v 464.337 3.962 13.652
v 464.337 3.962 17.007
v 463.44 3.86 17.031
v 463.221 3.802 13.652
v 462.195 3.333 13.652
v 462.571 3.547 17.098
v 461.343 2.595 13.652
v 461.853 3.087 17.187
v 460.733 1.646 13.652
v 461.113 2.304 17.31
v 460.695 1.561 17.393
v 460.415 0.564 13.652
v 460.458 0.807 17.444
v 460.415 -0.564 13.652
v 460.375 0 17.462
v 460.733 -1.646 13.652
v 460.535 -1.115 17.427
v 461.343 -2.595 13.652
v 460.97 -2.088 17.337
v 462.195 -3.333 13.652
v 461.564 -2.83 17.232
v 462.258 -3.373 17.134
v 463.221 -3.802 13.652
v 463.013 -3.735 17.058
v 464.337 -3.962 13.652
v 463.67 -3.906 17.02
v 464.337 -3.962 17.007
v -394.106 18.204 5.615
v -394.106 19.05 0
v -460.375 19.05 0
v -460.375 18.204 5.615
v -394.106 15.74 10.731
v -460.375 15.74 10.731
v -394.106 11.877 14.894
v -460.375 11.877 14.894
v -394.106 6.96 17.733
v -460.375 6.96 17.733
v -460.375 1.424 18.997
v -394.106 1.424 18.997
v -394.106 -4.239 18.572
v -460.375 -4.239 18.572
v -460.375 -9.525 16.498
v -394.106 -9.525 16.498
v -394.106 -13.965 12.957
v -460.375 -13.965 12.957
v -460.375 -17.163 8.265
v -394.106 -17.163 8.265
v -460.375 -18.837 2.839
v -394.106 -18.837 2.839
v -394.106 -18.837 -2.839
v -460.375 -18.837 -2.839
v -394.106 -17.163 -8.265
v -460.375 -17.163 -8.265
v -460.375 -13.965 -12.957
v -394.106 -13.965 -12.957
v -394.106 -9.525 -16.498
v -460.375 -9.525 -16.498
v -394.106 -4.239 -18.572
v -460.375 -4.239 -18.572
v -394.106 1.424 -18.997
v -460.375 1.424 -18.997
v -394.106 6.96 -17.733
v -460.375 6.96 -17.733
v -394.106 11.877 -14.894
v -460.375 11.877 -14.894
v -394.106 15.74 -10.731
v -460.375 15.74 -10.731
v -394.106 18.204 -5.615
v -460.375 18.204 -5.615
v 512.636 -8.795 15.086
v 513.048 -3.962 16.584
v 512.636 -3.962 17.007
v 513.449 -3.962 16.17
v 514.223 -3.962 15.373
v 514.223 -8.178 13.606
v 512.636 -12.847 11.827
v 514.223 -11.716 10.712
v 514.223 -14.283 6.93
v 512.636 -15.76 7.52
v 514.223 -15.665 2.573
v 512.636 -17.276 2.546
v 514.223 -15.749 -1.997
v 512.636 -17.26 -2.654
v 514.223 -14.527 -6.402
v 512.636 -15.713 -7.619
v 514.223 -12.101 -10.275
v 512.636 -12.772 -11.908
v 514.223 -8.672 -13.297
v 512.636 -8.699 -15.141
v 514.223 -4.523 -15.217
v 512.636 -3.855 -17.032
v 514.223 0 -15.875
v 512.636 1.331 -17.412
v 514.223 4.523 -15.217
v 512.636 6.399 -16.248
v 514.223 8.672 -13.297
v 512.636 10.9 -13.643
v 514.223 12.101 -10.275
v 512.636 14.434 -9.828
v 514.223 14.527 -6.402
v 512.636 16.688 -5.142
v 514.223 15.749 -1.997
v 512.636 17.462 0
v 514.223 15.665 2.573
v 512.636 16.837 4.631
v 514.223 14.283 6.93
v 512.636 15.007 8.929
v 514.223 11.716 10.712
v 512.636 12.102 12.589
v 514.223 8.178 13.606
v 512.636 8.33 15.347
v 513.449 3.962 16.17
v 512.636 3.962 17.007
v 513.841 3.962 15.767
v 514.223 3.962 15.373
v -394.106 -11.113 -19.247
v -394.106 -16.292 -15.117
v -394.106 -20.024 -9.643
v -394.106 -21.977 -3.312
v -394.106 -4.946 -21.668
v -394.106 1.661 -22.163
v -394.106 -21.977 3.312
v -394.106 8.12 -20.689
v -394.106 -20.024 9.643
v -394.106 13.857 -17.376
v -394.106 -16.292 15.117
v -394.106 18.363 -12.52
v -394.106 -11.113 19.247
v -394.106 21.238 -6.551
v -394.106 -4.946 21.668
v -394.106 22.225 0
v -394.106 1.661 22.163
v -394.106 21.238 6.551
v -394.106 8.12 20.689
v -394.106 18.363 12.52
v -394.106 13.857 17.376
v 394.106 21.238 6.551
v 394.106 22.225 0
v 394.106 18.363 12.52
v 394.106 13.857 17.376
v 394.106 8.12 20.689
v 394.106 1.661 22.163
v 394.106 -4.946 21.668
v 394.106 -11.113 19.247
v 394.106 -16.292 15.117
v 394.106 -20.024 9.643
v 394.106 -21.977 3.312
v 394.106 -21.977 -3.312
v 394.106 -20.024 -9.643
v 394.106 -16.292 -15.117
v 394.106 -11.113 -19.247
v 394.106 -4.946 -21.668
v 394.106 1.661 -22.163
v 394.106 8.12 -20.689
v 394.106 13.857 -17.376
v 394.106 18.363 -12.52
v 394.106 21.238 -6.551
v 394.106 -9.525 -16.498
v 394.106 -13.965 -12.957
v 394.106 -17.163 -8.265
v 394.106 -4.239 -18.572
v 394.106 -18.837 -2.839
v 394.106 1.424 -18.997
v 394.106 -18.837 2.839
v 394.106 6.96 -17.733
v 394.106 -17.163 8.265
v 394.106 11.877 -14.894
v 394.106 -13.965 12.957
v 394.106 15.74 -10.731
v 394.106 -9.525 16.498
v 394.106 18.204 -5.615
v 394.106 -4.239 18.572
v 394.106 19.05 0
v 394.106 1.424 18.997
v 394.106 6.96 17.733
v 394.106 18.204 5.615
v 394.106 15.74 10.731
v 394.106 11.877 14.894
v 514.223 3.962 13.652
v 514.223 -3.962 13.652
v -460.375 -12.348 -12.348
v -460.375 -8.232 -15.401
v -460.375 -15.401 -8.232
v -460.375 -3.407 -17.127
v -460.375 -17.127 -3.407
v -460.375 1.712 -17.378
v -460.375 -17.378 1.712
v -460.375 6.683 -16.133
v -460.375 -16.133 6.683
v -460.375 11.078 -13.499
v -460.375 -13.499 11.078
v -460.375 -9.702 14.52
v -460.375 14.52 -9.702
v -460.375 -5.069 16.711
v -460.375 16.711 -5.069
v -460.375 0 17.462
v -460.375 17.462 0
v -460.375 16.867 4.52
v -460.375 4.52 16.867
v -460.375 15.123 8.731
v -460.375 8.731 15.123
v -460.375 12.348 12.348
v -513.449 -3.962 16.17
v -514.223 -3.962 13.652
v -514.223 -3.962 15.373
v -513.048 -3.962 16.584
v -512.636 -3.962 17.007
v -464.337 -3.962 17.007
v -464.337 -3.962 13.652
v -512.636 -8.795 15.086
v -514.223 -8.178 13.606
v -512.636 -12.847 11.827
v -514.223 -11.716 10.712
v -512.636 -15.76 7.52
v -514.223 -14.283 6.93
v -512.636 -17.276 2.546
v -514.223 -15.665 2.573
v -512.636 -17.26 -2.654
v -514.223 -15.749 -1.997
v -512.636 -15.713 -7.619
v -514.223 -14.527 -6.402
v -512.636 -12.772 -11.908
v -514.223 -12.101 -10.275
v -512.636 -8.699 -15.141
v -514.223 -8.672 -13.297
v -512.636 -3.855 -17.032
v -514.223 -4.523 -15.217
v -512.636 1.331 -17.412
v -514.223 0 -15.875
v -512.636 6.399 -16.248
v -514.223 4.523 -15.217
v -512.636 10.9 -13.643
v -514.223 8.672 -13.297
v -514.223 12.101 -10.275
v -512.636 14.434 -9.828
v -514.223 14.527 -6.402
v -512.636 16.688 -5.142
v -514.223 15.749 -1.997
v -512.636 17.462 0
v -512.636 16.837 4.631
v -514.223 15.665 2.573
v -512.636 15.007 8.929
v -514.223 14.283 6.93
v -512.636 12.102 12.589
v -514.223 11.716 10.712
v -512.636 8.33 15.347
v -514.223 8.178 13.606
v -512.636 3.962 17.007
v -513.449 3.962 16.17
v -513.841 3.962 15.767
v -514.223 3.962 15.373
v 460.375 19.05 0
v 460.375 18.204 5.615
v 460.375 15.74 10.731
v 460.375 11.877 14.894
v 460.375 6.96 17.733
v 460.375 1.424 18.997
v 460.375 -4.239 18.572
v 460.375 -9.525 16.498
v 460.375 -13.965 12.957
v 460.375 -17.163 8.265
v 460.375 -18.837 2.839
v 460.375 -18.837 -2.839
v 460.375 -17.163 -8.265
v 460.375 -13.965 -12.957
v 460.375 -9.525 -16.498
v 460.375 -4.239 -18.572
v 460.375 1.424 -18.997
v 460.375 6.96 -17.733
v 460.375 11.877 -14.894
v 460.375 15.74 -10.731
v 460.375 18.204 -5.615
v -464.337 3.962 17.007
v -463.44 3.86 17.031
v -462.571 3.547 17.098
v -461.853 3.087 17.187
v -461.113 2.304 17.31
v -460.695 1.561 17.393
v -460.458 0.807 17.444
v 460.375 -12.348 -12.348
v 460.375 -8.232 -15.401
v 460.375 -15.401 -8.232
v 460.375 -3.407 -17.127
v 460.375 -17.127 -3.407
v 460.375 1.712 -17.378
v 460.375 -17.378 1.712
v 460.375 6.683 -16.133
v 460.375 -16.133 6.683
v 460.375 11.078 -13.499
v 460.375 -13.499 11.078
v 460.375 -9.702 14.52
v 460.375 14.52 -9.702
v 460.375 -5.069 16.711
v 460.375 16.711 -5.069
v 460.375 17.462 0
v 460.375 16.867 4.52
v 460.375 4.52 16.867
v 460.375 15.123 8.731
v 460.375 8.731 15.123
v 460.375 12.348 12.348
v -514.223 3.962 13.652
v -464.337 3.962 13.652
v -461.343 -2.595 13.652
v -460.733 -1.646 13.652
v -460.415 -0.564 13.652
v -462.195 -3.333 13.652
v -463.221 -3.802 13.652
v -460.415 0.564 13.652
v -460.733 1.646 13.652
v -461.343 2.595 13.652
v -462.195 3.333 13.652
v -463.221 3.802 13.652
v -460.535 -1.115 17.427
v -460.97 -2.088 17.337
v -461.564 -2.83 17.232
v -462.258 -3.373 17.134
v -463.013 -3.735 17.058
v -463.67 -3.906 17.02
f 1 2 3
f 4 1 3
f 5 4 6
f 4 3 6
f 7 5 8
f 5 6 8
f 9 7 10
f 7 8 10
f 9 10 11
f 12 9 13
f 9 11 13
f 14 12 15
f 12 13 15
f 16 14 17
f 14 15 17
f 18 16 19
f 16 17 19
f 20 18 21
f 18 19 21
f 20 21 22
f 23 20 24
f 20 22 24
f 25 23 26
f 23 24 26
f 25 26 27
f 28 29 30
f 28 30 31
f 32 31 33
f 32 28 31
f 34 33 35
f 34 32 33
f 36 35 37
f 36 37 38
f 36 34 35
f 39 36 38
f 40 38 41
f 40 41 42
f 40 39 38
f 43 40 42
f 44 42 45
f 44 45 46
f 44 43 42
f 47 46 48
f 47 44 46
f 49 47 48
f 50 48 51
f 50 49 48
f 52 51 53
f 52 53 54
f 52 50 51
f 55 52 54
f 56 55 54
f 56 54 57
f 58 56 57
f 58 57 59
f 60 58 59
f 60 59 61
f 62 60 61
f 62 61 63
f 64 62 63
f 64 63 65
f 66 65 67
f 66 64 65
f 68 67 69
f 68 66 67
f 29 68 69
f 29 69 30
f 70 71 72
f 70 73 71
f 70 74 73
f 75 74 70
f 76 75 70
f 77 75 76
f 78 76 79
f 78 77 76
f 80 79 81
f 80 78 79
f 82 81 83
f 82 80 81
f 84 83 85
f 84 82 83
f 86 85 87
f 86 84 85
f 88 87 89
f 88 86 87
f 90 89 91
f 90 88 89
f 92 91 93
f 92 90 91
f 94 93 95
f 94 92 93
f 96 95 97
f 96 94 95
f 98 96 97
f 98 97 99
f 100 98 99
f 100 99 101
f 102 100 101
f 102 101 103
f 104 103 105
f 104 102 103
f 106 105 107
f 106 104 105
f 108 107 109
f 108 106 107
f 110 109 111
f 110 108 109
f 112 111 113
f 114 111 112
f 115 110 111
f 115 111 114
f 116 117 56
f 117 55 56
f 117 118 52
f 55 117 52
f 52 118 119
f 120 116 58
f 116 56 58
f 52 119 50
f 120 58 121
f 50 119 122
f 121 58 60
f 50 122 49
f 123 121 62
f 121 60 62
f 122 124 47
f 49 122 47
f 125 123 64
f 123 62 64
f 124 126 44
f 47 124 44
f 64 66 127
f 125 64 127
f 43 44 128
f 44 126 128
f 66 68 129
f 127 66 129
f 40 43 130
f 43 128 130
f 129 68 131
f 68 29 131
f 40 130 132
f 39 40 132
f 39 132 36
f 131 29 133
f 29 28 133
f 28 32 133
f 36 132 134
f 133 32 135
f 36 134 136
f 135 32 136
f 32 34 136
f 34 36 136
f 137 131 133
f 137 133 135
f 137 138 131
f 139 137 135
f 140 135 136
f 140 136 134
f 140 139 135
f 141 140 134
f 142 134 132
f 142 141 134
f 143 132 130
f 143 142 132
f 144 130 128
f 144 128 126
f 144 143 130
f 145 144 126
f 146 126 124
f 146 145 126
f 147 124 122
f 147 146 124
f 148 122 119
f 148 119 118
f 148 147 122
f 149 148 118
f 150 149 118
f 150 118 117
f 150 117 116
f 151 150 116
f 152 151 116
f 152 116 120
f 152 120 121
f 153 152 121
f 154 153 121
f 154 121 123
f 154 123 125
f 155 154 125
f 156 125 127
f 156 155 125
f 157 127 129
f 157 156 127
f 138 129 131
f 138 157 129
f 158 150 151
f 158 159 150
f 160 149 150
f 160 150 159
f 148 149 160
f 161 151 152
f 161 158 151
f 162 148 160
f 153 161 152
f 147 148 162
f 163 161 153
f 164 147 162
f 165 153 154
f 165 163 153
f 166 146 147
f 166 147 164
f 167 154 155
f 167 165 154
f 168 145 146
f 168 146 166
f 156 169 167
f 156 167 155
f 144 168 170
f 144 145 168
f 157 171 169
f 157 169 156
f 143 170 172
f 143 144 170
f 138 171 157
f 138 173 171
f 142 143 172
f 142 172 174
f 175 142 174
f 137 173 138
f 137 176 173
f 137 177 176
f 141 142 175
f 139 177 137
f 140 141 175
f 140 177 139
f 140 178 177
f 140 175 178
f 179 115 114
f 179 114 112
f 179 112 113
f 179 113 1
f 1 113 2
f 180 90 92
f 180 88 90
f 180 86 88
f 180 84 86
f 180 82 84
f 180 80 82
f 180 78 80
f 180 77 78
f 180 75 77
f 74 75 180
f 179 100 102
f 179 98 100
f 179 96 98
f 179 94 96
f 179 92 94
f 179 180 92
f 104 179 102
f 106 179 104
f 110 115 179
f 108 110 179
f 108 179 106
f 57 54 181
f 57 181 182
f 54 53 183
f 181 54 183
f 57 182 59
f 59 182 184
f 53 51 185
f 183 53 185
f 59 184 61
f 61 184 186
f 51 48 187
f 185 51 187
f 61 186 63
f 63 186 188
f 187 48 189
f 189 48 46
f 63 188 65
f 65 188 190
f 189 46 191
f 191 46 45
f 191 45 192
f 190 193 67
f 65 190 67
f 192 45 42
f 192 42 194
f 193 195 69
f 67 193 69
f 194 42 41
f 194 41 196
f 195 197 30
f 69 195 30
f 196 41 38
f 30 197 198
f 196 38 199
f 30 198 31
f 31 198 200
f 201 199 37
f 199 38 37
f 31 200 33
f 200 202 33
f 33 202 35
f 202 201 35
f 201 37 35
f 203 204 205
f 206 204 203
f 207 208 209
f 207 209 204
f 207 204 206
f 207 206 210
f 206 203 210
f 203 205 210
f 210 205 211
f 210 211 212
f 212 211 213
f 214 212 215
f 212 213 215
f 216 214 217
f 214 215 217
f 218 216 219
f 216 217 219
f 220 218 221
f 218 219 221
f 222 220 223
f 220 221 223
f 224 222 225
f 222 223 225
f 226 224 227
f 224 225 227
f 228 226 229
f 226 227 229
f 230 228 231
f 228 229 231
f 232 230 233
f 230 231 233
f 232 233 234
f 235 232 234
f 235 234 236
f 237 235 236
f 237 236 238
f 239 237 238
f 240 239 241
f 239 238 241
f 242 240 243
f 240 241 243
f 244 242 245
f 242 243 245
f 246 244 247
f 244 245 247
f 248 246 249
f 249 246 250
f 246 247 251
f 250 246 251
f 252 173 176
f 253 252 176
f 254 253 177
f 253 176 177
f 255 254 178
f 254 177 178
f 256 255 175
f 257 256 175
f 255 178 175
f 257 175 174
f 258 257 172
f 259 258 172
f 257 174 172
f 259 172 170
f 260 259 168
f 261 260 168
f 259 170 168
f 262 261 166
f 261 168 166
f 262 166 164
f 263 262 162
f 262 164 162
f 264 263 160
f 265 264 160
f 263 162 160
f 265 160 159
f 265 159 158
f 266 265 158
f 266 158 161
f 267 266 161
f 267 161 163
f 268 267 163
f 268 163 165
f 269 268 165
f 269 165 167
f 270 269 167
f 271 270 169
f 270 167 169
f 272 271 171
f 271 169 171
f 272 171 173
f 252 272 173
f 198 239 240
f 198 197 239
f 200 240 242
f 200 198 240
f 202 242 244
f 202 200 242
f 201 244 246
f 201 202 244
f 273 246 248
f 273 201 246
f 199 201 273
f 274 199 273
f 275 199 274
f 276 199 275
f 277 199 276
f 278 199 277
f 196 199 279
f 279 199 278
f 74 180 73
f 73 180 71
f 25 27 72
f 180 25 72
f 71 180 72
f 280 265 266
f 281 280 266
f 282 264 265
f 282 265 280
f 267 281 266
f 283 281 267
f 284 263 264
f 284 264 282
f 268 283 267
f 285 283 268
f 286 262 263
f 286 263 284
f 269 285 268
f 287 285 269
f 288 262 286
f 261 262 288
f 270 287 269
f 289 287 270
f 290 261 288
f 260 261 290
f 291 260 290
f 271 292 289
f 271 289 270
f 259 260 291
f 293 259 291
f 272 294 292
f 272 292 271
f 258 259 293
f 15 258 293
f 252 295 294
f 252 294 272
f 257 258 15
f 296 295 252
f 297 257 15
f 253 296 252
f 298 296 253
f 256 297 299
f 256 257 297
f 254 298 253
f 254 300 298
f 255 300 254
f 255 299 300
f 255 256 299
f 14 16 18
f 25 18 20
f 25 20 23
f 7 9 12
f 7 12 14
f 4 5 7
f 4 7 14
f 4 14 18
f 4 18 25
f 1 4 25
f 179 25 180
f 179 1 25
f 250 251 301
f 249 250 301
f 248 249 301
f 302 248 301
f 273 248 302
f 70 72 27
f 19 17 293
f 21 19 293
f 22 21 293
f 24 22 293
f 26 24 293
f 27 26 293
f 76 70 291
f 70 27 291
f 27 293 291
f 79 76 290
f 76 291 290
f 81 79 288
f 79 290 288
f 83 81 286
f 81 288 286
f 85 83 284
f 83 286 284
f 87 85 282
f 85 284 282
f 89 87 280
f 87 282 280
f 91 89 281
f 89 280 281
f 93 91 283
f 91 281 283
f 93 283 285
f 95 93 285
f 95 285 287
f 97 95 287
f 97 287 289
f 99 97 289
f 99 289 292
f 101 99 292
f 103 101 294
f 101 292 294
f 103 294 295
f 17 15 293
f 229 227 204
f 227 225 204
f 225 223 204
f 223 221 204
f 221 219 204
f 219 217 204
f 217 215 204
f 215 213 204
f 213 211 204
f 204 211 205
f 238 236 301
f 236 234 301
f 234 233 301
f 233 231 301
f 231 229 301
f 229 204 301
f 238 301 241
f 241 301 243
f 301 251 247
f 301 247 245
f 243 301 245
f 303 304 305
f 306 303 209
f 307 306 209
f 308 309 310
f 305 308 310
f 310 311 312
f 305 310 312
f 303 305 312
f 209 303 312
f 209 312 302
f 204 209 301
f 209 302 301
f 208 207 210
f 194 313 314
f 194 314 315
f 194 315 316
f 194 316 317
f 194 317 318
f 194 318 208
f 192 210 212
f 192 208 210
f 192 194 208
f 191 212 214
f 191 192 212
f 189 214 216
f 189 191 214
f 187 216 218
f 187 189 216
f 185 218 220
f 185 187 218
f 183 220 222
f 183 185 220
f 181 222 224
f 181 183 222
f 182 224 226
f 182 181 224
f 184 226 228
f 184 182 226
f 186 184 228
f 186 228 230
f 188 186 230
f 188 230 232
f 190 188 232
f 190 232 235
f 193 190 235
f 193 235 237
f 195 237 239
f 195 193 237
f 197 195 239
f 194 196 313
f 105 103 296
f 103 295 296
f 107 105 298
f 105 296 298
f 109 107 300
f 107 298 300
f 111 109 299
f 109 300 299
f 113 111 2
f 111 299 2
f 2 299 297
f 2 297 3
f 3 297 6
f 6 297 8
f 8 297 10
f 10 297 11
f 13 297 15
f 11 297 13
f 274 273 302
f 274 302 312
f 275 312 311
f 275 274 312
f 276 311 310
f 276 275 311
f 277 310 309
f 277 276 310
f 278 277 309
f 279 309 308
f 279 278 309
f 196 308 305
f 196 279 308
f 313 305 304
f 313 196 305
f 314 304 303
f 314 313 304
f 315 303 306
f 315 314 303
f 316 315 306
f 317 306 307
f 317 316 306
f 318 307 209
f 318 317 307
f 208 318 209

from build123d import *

# Parameters (mm, degrees)
F0_R     = 22.225
F1_DEPTH = 394.1064
F2_R     = 19.05
F3_DEPTH = 66.2686
F4_R     = 17.4625
F5_DEPTH = 53.848
F6_SIZE  = 1.5875
F9_DEPTH = 3.81


with BuildPart() as f1:
    # F0 (on Right) → F1 (new body)
    with BuildSketch(Plane.YZ):
        Circle(F0_R)
    extrude(amount=F1_DEPTH)

    # F2 (on face) → F3 (join)
    with BuildSketch(Plane.YZ.offset(394.1064)):
        Circle(F2_R)
    extrude(amount=F3_DEPTH)

    # F4 (on face) → F5 (join)
    with BuildSketch(Plane.YZ.offset(460.375)):
        Circle(F4_R)
    extrude(amount=F5_DEPTH)

    # F6
    f6_edges = [f1.edges().sort_by_distance(p)[0] for p in [
        (514.223, -17.4625, 0),
    ]]
    chamfer(f6_edges, length=F6_SIZE)

    # F8 (on offset) → F9 (cut)
    with BuildSketch(Plane.XY.offset(17.4625)):
        with BuildLine():
            Line((521.658003, 3.9624), (464.3374, 3.9624))
            ThreePointArc((464.3374, 3.9624), (460.375, 0), (464.3374, -3.9624))
            Line((464.3374, -3.9624), (521.658003, -3.9624))
            Line((521.658003, -3.9624), (521.658003, 3.9624))
        make_face()
    extrude(amount=-F9_DEPTH, mode=Mode.SUBTRACT)

    # F10: F1 across plane


with BuildPart() as f1_1:
    add(f1.part)
    add(f1.part.mirror(Plane.YZ))


solid = f1_1.part
